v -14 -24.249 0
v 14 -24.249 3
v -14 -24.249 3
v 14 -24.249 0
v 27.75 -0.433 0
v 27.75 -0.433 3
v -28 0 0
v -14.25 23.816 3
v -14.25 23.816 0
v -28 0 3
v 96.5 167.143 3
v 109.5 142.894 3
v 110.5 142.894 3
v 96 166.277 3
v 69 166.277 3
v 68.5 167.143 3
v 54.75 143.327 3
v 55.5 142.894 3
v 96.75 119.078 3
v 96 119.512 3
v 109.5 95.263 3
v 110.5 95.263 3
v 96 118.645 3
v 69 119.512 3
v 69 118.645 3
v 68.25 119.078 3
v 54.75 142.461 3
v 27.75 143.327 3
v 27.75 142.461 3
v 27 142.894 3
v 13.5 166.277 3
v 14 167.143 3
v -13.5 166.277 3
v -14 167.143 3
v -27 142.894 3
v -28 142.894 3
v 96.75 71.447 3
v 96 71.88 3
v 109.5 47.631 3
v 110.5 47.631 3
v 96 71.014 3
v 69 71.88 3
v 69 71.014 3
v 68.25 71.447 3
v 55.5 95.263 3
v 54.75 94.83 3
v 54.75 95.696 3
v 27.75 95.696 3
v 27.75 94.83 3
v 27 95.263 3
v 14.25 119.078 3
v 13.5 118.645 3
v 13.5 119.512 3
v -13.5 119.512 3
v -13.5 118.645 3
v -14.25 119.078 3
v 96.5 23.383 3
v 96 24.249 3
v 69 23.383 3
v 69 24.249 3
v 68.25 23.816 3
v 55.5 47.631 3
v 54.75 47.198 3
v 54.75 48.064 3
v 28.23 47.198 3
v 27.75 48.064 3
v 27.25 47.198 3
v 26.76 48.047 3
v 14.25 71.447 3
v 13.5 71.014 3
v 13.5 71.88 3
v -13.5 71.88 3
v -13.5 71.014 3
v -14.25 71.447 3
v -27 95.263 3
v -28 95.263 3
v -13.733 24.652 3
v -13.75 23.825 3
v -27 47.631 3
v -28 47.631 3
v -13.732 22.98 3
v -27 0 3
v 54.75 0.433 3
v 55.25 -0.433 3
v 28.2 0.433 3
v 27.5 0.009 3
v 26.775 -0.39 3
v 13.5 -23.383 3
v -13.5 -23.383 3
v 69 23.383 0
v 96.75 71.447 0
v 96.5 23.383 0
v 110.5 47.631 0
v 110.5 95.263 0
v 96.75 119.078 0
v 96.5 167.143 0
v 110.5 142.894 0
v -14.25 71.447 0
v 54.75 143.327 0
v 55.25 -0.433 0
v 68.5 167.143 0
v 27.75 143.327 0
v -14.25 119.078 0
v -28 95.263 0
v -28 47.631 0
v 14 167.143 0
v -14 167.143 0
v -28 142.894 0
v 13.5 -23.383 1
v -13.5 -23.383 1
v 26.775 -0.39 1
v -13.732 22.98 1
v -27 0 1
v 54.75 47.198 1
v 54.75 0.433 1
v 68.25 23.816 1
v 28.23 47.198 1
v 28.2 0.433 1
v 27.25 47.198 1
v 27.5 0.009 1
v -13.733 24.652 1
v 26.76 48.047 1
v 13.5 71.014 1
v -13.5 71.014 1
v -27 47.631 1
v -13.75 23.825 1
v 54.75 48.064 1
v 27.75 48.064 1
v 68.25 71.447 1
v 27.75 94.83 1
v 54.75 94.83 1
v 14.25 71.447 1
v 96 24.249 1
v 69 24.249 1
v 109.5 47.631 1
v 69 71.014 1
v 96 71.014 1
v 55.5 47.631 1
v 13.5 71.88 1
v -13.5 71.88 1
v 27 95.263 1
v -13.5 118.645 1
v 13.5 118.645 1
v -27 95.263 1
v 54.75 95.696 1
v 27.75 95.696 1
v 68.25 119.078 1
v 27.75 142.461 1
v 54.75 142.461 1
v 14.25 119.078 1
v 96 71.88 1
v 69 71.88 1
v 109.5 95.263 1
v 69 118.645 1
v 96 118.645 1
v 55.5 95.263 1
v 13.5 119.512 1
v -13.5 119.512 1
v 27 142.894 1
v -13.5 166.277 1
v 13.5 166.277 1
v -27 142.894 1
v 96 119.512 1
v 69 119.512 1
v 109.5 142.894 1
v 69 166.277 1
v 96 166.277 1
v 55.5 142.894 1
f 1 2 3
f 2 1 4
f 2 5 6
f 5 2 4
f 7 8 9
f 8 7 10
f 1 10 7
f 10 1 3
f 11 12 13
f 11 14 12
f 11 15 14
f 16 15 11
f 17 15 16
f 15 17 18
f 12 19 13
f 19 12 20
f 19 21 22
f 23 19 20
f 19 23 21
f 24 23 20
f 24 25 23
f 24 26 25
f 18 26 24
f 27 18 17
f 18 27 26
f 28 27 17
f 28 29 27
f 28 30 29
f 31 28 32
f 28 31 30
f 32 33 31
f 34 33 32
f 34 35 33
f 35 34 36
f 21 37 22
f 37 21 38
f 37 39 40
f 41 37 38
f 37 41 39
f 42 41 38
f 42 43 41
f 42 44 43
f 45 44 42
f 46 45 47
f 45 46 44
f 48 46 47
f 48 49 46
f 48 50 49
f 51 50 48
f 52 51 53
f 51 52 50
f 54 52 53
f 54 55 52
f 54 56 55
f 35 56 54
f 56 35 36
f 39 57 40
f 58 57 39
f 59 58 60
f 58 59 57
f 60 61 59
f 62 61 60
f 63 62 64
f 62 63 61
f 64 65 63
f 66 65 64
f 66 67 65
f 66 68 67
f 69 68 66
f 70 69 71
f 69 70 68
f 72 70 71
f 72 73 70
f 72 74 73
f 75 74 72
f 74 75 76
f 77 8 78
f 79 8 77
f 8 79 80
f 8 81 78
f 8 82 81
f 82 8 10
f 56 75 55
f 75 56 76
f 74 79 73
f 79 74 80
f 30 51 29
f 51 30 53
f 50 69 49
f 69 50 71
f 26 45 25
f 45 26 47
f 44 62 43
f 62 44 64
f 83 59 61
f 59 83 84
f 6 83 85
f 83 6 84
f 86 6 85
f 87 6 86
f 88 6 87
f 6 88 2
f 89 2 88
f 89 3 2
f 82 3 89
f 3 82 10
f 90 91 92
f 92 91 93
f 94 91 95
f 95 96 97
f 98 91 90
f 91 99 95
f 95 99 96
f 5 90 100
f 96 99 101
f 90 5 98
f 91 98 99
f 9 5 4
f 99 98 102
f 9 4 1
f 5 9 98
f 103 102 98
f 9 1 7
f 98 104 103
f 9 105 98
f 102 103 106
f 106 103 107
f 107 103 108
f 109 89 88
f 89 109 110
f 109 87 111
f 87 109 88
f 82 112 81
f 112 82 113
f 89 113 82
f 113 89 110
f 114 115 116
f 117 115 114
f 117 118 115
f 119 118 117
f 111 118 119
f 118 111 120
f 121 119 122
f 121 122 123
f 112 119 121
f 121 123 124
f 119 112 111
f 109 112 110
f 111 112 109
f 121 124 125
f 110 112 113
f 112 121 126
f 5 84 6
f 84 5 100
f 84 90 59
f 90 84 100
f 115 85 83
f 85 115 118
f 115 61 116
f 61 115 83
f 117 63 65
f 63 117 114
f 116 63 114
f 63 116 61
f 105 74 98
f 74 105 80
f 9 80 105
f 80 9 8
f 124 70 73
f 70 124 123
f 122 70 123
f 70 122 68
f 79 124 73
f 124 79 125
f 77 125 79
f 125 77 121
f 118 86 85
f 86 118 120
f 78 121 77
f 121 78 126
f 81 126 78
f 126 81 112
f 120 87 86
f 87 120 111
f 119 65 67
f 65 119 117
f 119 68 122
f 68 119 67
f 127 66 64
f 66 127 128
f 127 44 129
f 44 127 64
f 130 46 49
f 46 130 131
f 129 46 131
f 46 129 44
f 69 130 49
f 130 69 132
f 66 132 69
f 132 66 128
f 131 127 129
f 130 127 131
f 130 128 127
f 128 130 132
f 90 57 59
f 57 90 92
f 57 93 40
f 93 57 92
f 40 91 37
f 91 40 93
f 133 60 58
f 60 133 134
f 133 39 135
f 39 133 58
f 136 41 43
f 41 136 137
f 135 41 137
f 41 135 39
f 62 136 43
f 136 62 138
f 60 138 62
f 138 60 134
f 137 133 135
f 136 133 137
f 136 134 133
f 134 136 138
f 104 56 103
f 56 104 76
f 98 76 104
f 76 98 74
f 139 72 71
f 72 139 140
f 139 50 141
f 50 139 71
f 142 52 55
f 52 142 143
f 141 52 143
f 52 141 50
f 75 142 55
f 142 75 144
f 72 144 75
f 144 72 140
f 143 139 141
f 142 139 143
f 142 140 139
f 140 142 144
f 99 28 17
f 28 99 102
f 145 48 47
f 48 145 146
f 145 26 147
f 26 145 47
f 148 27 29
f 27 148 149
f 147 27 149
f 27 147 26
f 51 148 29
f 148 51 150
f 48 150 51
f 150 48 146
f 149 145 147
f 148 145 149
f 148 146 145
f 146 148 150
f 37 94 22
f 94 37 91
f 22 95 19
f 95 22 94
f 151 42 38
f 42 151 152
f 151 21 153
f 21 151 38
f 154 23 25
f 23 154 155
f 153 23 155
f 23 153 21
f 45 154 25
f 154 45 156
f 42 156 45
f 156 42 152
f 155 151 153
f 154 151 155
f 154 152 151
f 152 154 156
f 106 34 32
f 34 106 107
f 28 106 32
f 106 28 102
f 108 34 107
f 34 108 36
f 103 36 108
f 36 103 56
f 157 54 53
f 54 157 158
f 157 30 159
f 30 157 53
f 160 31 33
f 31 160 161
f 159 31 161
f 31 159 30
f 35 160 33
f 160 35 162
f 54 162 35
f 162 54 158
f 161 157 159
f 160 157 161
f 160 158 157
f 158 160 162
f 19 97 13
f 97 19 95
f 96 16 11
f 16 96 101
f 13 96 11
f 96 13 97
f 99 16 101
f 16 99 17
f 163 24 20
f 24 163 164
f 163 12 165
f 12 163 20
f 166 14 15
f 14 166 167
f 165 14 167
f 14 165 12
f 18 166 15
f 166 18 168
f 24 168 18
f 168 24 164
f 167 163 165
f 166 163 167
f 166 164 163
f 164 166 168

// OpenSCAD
$fn = 150;

union() {
	difference() {
		union() {
			translate(v = [0.0, 0.0, 0]) {
				difference() {
					cylinder($fn = 6, d = 56.0, h = 3.0);
					translate(v = [0, 0, 1.0]) {
						cylinder($fn = 6, d = 54.0, h = 3.0);
					}
				}
			}
			translate(v = [41.25, 23.81569860407206, 0]) {
				difference() {
					cylinder($fn = 6, d = 56.0, h = 3.0);
					translate(v = [0, 0, 1.0]) {
						cylinder($fn = 6, d = 54.0, h = 3.0);
					}
				}
			}
			translate(v = [0.0, 47.63139720814412, 0]) {
				difference() {
					cylinder($fn = 6, d = 56.0, h = 3.0);
					translate(v = [0, 0, 1.0]) {
						cylinder($fn = 6, d = 54.0, h = 3.0);
					}
				}
			}
		}
		translate(v = [13.75, 23.824673200287624, 1.0]) {
			cylinder(d = 55.0, h = 3.5);
		}
	}
	translate(v = [41.25, 71.44709581221619, 0]) {
		difference() {
			cylinder($fn = 6, d = 56.0, h = 3.0);
			translate(v = [0, 0, 1.0]) {
				cylinder($fn = 6, d = 54.0, h = 3.0);
			}
		}
	}
	translate(v = [82.5, 47.63139720814412, 0]) {
		difference() {
			cylinder($fn = 6, d = 56.0, h = 3.0);
			translate(v = [0, 0, 1.0]) {
				cylinder($fn = 6, d = 54.0, h = 3.0);
			}
		}
	}
	translate(v = [0.0, 95.26279441628824, 0]) {
		difference() {
			cylinder($fn = 6, d = 56.0, h = 3.0);
			translate(v = [0, 0, 1.0]) {
				cylinder($fn = 6, d = 54.0, h = 3.0);
			}
		}
	}
	translate(v = [41.25, 119.0784930203603, 0]) {
		difference() {
			cylinder($fn = 6, d = 56.0, h = 3.0);
			translate(v = [0, 0, 1.0]) {
				cylinder($fn = 6, d = 54.0, h = 3.0);
			}
		}
	}
	translate(v = [82.5, 95.26279441628824, 0]) {
		difference() {
			cylinder($fn = 6, d = 56.0, h = 3.0);
			translate(v = [0, 0, 1.0]) {
				cylinder($fn = 6, d = 54.0, h = 3.0);
			}
		}
	}
	translate(v = [0.0, 142.89419162443238, 0]) {
		difference() {
			cylinder($fn = 6, d = 56.0, h = 3.0);
			translate(v = [0, 0, 1.0]) {
				cylinder($fn = 6, d = 54.0, h = 3.0);
			}
		}
	}
	translate(v = [82.5, 142.89419162443238, 0]) {
		difference() {
			cylinder($fn = 6, d = 56.0, h = 3.0);
			translate(v = [0, 0, 1.0]) {
				cylinder($fn = 6, d = 54.0, h = 3.0);
			}
		}
	}
}
